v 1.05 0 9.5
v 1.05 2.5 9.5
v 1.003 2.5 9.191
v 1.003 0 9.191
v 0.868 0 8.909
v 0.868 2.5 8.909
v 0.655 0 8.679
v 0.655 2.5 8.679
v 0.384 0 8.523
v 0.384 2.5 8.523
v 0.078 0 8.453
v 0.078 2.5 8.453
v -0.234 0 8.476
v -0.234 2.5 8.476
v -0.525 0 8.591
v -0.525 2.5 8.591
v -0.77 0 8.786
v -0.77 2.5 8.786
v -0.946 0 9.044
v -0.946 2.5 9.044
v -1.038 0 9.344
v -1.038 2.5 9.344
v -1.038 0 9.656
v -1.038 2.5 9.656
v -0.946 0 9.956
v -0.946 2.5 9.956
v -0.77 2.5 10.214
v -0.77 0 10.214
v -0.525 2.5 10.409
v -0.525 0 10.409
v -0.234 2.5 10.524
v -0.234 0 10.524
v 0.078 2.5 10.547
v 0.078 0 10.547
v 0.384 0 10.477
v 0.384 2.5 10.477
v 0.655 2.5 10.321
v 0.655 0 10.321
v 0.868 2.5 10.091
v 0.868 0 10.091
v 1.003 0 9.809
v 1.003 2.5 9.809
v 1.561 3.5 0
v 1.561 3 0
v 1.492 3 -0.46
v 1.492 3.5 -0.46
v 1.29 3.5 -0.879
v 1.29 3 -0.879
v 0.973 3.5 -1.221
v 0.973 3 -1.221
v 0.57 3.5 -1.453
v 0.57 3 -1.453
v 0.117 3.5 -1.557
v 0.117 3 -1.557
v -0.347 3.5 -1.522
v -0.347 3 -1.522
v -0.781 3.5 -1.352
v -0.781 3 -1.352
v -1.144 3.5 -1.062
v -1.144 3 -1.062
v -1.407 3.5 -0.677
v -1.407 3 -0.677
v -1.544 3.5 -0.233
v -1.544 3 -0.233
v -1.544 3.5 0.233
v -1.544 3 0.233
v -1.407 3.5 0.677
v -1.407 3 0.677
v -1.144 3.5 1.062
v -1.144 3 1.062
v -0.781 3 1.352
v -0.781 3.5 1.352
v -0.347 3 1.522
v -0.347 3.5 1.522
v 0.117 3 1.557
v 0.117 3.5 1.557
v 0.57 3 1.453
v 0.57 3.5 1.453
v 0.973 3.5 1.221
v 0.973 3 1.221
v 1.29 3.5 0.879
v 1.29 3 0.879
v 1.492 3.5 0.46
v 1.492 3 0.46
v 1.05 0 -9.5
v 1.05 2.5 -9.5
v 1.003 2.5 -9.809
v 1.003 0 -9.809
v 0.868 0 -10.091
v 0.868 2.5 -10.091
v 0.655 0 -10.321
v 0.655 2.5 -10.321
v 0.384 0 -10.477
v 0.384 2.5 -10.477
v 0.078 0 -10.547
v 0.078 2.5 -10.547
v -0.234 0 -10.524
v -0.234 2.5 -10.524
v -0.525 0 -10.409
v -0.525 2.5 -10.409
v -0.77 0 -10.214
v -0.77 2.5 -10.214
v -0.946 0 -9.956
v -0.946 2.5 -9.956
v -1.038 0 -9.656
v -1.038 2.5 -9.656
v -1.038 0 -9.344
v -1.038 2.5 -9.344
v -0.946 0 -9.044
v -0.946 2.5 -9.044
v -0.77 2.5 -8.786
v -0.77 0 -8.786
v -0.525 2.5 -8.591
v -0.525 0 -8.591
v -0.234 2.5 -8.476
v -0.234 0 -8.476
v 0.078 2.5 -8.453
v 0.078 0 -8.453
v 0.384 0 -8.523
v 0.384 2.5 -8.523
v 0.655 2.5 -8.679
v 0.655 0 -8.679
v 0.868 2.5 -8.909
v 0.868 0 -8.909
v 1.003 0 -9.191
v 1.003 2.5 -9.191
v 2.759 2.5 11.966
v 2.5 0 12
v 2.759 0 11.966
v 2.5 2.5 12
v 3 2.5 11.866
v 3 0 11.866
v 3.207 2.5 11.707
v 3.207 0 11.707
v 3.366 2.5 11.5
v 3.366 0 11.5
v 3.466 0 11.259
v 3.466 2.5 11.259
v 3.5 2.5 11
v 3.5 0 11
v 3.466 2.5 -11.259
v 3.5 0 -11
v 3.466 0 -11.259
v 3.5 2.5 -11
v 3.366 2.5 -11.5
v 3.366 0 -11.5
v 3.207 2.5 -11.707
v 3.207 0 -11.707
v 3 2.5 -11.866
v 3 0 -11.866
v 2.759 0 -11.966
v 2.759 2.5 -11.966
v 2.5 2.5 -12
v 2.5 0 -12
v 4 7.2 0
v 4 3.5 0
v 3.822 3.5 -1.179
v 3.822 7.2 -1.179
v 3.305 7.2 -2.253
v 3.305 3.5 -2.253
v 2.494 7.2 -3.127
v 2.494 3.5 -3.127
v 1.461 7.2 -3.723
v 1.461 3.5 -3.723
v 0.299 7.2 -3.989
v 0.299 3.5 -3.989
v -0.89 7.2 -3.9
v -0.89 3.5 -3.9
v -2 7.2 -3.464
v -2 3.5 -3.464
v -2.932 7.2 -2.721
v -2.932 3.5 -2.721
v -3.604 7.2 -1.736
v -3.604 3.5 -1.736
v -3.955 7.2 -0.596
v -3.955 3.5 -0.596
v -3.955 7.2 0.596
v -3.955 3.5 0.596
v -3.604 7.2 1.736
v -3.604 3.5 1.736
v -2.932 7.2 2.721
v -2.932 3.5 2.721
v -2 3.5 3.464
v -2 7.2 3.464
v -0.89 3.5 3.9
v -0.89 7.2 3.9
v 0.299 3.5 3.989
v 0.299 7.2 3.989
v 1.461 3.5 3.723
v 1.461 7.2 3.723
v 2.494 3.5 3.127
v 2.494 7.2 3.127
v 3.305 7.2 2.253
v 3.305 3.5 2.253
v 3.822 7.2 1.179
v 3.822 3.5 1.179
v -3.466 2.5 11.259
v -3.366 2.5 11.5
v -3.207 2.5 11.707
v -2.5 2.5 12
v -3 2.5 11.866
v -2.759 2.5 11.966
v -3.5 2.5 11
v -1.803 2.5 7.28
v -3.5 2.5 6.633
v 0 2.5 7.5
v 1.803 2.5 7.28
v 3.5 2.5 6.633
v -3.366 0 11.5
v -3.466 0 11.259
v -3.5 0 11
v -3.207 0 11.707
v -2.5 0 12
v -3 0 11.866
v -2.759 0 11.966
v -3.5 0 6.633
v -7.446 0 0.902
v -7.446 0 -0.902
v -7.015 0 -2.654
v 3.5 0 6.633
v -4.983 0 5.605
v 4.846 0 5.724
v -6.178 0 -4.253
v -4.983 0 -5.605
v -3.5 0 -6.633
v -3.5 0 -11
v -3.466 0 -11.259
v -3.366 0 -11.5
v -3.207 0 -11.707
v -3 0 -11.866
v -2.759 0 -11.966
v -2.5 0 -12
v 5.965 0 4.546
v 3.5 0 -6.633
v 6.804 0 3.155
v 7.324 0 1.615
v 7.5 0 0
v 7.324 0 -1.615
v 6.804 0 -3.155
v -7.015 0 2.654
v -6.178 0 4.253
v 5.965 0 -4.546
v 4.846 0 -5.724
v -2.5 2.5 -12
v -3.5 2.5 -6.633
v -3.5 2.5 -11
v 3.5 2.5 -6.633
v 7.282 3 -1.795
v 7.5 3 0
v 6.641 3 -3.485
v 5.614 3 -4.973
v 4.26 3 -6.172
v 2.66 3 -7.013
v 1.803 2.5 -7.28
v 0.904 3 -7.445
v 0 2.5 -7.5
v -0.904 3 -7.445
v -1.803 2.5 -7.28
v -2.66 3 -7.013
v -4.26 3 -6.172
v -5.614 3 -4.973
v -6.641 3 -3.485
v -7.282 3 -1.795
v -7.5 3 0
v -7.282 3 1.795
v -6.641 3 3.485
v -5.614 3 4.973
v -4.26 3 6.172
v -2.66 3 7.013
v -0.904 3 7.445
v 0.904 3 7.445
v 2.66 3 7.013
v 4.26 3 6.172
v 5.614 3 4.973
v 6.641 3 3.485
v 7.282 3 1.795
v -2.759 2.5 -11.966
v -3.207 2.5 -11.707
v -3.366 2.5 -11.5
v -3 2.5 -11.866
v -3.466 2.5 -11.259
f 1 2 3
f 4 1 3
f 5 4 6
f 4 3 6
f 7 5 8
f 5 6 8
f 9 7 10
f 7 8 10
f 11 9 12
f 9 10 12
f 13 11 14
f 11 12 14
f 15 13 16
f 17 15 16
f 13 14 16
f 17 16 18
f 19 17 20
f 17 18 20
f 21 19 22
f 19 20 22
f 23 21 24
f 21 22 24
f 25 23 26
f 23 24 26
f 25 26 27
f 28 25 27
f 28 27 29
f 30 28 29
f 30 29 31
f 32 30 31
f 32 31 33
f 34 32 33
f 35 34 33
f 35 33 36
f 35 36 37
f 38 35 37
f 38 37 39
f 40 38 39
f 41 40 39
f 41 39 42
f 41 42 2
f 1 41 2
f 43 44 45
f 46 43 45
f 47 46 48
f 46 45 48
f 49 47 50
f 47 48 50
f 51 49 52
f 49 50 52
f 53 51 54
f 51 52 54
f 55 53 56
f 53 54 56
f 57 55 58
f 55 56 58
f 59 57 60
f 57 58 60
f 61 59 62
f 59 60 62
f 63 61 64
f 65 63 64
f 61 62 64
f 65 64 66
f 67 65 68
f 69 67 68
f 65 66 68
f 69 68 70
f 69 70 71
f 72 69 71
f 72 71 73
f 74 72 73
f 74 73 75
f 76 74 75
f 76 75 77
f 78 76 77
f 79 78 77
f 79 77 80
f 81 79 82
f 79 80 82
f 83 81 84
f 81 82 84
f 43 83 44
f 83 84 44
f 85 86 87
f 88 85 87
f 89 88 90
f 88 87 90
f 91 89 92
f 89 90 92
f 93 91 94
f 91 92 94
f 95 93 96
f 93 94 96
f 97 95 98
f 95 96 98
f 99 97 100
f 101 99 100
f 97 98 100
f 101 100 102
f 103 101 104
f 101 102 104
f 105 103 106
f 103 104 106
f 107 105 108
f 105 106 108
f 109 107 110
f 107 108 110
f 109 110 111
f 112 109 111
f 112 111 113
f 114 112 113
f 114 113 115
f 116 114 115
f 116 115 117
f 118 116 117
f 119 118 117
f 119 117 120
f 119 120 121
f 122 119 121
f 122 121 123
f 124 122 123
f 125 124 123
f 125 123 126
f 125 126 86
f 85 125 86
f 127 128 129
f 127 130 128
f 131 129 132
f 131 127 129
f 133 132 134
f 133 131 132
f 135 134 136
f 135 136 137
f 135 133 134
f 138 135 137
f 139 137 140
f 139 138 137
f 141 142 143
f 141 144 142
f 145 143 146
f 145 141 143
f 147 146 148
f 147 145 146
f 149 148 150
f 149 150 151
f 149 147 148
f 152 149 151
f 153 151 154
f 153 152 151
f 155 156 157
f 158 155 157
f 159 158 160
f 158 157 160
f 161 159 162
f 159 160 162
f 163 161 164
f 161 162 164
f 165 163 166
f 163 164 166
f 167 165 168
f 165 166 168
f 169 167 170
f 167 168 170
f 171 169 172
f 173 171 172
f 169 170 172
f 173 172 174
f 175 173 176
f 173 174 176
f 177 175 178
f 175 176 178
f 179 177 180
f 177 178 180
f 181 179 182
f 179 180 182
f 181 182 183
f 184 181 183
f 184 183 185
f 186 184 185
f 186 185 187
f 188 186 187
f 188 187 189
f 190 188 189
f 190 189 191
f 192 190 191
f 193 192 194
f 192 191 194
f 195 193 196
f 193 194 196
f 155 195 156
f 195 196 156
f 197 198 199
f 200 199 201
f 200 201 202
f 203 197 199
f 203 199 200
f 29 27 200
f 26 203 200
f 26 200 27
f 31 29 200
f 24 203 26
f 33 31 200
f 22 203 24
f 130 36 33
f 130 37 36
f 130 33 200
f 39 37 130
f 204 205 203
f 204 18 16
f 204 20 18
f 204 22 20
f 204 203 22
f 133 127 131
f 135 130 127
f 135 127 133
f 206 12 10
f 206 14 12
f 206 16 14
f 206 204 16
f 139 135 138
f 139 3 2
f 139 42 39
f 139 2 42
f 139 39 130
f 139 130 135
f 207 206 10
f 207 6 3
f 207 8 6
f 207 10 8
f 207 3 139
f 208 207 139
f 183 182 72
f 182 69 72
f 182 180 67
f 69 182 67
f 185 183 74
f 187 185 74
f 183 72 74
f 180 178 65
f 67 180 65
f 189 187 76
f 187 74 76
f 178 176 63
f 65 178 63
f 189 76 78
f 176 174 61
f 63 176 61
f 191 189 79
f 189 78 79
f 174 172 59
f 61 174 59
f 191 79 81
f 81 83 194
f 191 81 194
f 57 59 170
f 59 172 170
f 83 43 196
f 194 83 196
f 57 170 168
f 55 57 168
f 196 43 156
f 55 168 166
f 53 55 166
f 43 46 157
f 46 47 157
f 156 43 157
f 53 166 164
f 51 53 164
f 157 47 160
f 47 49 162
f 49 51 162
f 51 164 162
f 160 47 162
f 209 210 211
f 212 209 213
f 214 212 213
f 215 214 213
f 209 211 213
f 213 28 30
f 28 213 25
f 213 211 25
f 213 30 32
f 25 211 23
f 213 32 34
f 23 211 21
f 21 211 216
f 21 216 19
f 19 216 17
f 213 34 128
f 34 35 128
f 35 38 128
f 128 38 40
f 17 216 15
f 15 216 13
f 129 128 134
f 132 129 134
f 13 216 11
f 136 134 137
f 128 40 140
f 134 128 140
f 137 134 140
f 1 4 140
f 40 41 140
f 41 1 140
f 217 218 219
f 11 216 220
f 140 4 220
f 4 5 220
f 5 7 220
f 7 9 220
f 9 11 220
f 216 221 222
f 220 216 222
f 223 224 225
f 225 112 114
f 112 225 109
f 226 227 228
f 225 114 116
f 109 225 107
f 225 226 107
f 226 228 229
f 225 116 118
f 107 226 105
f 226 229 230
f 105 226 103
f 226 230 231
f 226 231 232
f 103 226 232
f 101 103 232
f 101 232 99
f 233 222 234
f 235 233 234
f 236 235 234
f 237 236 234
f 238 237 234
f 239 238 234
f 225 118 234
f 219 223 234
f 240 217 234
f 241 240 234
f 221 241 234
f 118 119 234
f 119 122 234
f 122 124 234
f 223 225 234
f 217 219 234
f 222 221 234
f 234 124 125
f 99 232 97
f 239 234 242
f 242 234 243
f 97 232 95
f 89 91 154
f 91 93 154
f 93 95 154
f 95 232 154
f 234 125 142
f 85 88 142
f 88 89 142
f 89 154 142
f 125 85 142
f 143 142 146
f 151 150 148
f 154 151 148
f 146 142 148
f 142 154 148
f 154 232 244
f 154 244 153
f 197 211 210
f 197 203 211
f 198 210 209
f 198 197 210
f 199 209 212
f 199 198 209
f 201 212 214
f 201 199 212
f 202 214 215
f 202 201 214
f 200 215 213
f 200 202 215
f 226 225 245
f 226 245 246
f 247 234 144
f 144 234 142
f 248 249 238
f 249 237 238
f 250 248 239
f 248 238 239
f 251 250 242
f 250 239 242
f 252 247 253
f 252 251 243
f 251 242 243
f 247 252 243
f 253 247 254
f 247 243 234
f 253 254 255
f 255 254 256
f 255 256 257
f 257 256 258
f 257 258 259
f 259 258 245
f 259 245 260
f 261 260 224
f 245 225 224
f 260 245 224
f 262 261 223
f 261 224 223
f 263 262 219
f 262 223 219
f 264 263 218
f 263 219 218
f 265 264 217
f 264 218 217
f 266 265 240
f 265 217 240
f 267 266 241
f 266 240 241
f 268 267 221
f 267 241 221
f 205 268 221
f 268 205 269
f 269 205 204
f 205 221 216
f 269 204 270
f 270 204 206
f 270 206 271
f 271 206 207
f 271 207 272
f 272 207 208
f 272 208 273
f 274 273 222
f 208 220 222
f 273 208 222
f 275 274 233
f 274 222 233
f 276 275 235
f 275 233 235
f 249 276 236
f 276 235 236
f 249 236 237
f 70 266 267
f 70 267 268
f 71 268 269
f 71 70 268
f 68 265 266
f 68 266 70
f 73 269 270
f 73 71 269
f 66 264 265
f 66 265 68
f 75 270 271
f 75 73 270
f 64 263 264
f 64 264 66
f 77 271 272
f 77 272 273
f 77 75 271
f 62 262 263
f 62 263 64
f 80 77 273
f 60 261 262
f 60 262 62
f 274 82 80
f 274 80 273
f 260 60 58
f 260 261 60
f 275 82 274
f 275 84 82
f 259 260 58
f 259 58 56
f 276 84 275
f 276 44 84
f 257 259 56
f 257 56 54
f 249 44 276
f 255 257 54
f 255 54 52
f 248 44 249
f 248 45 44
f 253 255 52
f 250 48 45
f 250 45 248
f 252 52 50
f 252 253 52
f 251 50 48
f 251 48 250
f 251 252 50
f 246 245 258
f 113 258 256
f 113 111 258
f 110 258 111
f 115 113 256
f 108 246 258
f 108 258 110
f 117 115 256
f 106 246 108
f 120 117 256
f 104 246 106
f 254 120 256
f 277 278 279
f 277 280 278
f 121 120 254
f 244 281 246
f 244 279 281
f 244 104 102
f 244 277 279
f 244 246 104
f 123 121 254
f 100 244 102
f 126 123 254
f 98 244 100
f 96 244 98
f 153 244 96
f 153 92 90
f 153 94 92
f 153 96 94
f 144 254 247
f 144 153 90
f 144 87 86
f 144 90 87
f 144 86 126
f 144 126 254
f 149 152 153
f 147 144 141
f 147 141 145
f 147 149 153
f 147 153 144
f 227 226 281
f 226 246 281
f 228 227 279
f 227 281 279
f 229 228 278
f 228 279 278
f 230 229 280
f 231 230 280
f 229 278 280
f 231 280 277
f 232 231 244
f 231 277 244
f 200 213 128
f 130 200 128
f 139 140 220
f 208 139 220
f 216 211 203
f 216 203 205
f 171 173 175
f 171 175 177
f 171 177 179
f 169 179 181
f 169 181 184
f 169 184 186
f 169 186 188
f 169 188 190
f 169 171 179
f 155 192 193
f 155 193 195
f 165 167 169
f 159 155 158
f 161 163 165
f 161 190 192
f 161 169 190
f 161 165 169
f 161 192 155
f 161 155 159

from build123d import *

# Parameters (mm, degrees)
SKETCH1_W                = 7
SKETCH1_H                = 24
BOSS_EXTRUDE1_DEPTH      = 2.5
FILLET1_R                = 1
SKETCH2_R                = 7.5
BOSS_EXTRUDE2_DEPTH      = 0.5
BOSS_EXTRUDE2_DEPTH_BACK = 2.5
SKETCH3_R                = 1.05
CUT_EXTRUDE1_DEPTH       = 22.5
SKETCH5_R                = 1.561205439
BOSS_EXTRUDE3_DEPTH      = 0.5
SKETCH6_R                = 4
BOSS_EXTRUDE4_DEPTH      = 3.7


with BuildPart() as part:
    # Sketch1 → Boss-Extrude1 (new body)
    with BuildSketch(Plane(origin=(0, 0, 0), x_dir=(1, 0, 0), z_dir=(0, 1, 0))):
        Rectangle(SKETCH1_W, SKETCH1_H)
    extrude(amount=BOSS_EXTRUDE1_DEPTH)

    # Fillet1
    fillet1_edges = [part.edges().sort_by_distance(p)[0] for p in [
        (3.5, 1.25, 12),
        (-3.5, 1.25, 12),
        (-3.5, 1.25, -12),
        (3.5, 1.25, -12),
    ]]
    fillet(fillet1_edges, radius=FILLET1_R)

    # Sketch2 → Boss-Extrude2 (add, two sides)
    with BuildSketch(Plane(origin=(0, 2.5, 0), x_dir=(1, 0, 0), z_dir=(0, 1, 0))) as boss_extrude2_sk:
        Circle(SKETCH2_R)
    extrude(amount=BOSS_EXTRUDE2_DEPTH)
    extrude(boss_extrude2_sk.sketch, amount=-BOSS_EXTRUDE2_DEPTH_BACK)

    # Sketch3 → Cut-Extrude1 (cut)
    with BuildSketch(Plane(origin=(0, 2.5, 0), x_dir=(1, 0, 0), z_dir=(0, 1, 0))):
        with Locations((0, 9.5)):
            Circle(SKETCH3_R)
        with Locations((0, -9.5)):
            Circle(SKETCH3_R)
    extrude(amount=-CUT_EXTRUDE1_DEPTH, mode=Mode.SUBTRACT)

    # Sketch5 → Boss-Extrude3 (add)
    with BuildSketch(Plane(origin=(0, 3, 0), x_dir=(1, 0, 0), z_dir=(0, 1, 0))):
        Circle(SKETCH5_R)
    extrude(amount=BOSS_EXTRUDE3_DEPTH)

    # Sketch6 → Boss-Extrude4 (add)
    with BuildSketch(Plane(origin=(0, 3.5, 0), x_dir=(1, 0, 0), z_dir=(0, 1, 0))):
        Circle(SKETCH6_R)
    extrude(amount=BOSS_EXTRUDE4_DEPTH)


solid = part.part
